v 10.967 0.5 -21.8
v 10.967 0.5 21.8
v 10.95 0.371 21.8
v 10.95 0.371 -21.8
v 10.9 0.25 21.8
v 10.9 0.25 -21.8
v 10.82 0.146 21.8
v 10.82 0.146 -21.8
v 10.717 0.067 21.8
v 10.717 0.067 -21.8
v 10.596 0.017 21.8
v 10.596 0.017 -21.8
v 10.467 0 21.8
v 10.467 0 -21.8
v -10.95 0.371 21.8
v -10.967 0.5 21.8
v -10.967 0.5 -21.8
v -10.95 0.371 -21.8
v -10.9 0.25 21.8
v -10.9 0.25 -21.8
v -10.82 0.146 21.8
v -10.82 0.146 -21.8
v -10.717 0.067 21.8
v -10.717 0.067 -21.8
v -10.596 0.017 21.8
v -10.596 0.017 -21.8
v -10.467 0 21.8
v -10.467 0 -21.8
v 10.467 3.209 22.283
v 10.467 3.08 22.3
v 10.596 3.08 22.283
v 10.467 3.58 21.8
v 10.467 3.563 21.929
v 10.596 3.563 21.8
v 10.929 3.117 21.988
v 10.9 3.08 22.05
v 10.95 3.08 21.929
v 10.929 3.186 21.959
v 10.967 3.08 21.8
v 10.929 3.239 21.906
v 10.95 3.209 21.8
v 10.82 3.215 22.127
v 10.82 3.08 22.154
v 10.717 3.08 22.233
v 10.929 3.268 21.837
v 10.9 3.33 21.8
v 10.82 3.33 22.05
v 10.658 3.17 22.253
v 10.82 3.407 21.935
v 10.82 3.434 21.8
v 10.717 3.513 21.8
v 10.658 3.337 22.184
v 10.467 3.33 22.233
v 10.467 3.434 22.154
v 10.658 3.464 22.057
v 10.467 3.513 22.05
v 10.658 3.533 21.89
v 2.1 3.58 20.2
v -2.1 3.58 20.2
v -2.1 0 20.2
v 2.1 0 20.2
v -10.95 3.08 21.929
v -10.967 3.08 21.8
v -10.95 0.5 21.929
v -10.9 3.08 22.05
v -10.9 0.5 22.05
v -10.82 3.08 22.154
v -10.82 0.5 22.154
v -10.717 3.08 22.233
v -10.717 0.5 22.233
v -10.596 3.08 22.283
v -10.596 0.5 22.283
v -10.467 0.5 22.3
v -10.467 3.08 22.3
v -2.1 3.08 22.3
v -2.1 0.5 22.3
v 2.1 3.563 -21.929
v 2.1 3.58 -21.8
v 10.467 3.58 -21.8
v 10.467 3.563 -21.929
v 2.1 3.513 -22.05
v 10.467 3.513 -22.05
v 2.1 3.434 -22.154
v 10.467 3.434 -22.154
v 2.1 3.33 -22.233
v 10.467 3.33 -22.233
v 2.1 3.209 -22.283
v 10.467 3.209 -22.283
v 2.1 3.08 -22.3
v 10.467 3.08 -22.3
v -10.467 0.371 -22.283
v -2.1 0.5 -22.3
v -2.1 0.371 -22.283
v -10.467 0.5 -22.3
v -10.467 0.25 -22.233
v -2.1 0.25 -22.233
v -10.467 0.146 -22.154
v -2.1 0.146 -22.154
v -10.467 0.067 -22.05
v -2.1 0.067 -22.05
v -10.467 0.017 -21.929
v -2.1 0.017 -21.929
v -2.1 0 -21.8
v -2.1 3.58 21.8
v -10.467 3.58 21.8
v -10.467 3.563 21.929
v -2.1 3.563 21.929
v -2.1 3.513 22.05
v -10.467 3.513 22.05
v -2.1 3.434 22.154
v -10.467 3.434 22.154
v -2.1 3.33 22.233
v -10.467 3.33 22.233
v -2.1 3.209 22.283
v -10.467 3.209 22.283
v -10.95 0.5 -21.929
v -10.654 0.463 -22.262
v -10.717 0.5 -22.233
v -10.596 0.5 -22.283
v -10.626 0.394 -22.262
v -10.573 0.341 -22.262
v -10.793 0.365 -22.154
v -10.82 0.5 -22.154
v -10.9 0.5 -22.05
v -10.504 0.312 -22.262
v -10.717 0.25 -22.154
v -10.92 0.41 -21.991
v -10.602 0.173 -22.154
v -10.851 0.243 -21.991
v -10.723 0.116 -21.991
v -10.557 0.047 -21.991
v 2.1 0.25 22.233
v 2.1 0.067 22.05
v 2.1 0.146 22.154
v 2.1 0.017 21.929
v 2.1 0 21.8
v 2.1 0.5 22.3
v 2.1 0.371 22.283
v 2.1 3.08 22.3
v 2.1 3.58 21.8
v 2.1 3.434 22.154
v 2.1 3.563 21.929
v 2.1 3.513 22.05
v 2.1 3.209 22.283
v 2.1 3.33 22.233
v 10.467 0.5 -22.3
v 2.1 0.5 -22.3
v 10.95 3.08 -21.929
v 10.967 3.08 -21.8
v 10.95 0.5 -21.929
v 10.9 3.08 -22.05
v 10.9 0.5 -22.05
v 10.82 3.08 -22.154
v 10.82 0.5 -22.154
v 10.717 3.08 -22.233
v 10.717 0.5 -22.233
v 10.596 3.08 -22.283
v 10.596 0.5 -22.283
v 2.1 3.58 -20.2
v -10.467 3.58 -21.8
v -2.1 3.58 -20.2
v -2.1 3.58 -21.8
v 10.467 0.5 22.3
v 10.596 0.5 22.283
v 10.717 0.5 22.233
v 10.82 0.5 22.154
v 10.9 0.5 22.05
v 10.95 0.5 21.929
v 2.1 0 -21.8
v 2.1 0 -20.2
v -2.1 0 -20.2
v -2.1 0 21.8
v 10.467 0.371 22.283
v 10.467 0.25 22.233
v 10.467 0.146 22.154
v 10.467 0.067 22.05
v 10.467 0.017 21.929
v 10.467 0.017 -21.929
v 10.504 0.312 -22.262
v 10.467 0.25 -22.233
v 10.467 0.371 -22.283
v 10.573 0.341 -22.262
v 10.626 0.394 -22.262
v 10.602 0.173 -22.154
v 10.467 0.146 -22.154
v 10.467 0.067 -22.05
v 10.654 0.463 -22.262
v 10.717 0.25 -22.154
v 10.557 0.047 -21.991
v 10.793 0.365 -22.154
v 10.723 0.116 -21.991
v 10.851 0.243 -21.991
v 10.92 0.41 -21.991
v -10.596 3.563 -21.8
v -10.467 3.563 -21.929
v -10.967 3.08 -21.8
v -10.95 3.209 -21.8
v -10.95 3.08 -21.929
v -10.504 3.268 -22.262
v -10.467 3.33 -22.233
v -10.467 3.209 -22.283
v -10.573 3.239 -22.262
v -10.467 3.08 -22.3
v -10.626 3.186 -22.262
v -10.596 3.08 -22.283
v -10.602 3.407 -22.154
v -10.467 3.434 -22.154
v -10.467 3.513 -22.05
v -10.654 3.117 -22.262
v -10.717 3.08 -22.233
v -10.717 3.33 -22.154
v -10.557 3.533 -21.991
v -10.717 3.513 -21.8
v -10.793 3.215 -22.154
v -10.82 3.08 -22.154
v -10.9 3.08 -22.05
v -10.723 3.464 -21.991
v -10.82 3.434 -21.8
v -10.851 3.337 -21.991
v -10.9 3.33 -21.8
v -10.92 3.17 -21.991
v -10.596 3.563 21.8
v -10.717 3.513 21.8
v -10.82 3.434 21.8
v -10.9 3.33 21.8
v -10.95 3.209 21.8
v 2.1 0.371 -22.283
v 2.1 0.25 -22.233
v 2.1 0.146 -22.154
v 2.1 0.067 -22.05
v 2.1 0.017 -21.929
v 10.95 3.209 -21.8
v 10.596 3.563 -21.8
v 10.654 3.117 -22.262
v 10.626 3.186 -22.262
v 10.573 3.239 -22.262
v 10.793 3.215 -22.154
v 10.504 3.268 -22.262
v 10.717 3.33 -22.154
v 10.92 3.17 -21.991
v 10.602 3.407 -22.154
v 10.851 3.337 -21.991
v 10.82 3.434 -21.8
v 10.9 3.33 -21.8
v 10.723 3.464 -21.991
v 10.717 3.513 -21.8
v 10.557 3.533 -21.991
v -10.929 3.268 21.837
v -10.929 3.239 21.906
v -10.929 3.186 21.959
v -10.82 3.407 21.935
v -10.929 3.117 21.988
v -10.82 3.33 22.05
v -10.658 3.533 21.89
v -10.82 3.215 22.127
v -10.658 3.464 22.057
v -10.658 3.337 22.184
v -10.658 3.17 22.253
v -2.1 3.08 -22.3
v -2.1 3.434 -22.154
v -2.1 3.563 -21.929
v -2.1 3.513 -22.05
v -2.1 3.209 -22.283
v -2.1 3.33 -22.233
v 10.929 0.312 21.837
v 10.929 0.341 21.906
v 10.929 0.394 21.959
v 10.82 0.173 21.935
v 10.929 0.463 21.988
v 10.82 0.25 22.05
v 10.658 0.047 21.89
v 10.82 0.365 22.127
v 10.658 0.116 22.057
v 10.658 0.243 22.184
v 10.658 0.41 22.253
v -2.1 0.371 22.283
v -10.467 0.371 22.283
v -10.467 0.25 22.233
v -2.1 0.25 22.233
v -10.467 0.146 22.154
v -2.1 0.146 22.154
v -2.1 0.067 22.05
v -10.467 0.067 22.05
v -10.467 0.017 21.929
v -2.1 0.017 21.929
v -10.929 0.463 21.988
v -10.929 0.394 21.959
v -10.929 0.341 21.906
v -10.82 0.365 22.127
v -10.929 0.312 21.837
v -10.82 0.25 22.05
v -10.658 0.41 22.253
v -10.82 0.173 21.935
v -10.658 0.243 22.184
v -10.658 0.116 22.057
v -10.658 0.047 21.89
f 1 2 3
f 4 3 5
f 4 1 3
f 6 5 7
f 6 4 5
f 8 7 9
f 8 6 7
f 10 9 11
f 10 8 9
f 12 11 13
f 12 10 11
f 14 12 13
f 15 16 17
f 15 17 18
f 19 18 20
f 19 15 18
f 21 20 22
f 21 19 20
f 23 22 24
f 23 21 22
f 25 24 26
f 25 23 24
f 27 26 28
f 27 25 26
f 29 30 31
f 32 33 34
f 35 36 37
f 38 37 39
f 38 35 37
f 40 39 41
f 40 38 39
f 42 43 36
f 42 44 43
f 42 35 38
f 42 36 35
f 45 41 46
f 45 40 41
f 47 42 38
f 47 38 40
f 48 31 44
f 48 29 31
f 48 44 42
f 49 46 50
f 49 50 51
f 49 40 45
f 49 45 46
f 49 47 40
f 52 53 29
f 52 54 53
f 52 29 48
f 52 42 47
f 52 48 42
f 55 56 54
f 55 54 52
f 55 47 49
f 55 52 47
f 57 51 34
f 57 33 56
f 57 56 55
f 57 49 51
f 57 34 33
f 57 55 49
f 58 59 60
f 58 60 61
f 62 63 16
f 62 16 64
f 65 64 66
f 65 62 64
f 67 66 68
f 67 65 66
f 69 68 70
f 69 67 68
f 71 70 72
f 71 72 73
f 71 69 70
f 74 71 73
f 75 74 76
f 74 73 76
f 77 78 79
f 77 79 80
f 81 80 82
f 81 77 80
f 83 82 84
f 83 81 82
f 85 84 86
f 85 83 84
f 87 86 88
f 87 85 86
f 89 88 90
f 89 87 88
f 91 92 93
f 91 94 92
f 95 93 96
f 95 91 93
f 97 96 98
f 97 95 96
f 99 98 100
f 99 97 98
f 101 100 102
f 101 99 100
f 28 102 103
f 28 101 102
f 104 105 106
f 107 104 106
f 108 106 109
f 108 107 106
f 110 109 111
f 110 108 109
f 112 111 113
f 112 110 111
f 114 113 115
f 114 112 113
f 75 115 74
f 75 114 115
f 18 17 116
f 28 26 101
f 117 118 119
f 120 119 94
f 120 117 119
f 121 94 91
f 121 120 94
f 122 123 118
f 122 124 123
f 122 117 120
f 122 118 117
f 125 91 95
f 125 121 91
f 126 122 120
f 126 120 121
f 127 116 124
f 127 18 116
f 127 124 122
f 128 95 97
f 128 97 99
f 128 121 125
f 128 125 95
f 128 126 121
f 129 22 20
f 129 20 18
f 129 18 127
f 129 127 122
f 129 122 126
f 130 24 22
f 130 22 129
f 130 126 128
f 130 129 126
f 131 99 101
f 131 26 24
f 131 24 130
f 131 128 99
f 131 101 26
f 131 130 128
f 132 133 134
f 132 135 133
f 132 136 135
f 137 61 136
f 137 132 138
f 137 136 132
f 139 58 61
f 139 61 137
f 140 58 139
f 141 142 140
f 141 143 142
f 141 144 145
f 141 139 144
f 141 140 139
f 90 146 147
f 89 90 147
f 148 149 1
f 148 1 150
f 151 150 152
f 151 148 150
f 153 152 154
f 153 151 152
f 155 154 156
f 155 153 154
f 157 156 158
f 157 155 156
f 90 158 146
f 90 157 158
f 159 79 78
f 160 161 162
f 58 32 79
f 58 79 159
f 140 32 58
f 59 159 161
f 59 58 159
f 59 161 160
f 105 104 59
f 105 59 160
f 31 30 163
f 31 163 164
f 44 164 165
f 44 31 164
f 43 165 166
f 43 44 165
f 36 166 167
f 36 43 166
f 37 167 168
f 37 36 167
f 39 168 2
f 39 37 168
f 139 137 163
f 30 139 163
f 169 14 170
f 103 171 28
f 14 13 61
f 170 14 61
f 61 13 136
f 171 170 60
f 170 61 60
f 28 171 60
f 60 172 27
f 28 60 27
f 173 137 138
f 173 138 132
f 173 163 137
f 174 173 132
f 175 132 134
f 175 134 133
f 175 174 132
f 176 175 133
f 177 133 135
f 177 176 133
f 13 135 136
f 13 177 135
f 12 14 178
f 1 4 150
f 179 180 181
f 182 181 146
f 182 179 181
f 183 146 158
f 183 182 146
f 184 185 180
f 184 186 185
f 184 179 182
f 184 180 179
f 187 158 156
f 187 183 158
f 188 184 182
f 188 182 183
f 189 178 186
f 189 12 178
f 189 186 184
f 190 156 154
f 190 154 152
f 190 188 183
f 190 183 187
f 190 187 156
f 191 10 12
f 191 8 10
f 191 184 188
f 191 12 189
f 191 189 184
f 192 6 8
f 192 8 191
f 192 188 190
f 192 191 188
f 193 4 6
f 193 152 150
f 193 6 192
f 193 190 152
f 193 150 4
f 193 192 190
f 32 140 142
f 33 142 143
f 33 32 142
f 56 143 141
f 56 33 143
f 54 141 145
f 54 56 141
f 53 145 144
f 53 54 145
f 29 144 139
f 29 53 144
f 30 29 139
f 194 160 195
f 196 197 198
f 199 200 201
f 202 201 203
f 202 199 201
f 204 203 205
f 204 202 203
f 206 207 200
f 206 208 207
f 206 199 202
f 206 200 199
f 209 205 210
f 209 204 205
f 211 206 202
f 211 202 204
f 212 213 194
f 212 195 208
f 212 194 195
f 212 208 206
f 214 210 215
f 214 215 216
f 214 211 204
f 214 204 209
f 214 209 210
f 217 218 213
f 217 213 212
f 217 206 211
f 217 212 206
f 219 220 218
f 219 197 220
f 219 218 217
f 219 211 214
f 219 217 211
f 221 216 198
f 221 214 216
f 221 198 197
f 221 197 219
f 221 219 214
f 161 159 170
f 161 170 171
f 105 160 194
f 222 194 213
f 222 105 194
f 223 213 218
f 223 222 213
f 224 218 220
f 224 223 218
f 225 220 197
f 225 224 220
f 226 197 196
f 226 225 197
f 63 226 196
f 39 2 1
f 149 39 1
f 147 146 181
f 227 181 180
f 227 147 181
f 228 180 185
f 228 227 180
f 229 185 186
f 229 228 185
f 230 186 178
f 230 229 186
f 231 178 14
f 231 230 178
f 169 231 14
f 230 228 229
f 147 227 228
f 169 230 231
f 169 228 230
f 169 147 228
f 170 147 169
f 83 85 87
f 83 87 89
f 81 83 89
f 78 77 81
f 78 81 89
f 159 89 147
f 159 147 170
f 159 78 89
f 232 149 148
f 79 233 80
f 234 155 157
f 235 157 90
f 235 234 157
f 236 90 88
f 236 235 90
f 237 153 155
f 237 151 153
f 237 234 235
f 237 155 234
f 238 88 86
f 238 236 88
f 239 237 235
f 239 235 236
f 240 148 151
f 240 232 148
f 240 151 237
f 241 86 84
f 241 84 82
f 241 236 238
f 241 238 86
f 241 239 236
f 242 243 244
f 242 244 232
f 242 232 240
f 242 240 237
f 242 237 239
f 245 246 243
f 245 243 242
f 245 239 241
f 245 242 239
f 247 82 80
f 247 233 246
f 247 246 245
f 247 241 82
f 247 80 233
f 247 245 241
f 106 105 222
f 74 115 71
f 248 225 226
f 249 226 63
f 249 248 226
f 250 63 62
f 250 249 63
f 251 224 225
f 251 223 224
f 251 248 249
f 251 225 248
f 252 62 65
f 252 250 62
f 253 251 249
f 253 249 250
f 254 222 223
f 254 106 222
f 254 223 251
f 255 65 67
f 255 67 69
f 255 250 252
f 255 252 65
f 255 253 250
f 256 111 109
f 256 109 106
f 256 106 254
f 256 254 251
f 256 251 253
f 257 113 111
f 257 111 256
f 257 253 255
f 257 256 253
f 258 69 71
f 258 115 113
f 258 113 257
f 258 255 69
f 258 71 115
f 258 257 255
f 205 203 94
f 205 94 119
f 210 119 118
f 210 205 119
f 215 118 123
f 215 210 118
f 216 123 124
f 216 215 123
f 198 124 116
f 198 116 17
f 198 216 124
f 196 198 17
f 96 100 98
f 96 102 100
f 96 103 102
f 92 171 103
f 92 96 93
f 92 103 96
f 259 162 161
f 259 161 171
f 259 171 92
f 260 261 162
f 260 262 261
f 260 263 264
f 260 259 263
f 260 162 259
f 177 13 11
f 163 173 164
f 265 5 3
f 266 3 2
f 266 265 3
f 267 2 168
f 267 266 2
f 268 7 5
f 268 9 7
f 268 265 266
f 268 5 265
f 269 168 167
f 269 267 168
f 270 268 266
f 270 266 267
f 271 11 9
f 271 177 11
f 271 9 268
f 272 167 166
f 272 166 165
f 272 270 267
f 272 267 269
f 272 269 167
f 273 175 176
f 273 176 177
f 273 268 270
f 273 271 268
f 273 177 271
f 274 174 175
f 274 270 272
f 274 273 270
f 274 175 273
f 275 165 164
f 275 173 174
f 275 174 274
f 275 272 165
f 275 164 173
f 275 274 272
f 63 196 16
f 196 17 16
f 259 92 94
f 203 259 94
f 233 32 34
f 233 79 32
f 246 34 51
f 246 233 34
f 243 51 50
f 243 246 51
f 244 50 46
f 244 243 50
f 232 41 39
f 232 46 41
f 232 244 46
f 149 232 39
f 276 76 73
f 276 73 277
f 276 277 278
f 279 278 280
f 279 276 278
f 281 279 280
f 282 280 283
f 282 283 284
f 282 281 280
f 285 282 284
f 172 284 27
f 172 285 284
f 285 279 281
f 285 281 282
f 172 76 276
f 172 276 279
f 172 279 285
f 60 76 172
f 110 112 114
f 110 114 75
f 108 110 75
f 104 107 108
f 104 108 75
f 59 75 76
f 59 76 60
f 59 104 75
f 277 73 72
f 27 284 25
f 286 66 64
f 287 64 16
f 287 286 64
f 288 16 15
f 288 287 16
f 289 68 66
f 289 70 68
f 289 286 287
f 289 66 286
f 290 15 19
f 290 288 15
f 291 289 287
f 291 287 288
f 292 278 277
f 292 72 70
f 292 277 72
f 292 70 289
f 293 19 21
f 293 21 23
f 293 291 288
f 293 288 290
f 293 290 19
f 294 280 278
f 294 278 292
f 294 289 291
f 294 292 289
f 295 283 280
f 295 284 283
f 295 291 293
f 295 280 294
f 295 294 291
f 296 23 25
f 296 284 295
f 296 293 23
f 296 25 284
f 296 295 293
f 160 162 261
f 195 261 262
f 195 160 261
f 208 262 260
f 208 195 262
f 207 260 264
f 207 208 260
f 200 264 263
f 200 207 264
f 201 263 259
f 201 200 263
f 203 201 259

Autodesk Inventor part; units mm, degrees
ref_plane "Плоскость YZ" through (0, 0, 0) normal (1, 0, 0) x (0, 1, 0)
ref_plane "Плоскость XZ" through (0, 0, 0) normal (0, 1, 0) x (-1, 0, 0)
ref_plane "Плоскость XY" through (0, 0, 0) normal (0, 0, 1) x (1, 0, 0)
sketch "Эскиз1" plane through (0, 0, 0) normal (0, 1, 0) x (-1, 0, 0)
  line L0 (10.9667, 22.3) -> (-10.9667, 22.3)
  line L1 (-10.9667, 22.3) -> (-10.9667, -22.3)
  line L2 (-10.9667, -22.3) -> (10.9667, -22.3)
  line L3 (10.9667, -22.3) -> (10.9667, 22.3)
  line L4 (10.9667, 22.3) -> (-10.9667, -22.3) construction
  line L5 (-10.9667, 22.3) -> (10.9667, -22.3) construction
  point P0 (0, 0)
  dimension "d0" = 44.6
  dimension "d1" = 21.9333
extrude "Выдавливание1" add sketch "Эскиз1" along normal blind 3.58
fillet "Сопряжение1" radius 0.5 12 edges at (0, 3.58, 22.3) (0, 0, 22.3) (10.9667, 1.79, 22.3) (-10.9667, 1.79, 22.3) (-10.9667, 3.58, 0) (10.9667, 3.58, 0) (10.9667, 0, 0) (-10.9667, 0, 0) (0, 3.58, -22.3) (0, 0, -22.3) (-10.9667, 1.79, -22.3) (10.9667, 1.79, -22.3)
sketch "Эскиз2" plane through (0, 3.58, 0) normal (0, 1, 0) x (1, 0, 0)
  line L0 (-2.1, 24.4) -> (2.1, 24.4)
  line L1 (2.1, 24.4) -> (2.1, 20.2)
  line L2 (2.1, 20.2) -> (-2.1, 20.2)
  line L3 (-2.1, 20.2) -> (-2.1, 24.4)
  line L4 (10.4667, 22.3) -> (-10.4667, 22.3) projected
  line L5 (-2.1, 24.4) -> (2.1, 20.2) construction
  line L6 (2.1, 24.4) -> (-2.1, 20.2) construction
  point P0 (0, 0)
  point P1 (0, 22.3)
  dimension "d5" = 4.2
  dimension "d6" = 4.2
extrude "Выдавливание2" cut sketch "Эскиз2" against normal blind 10
mirror "Зеркальное отражение1" about plane through (0, 0, 0) normal (0, 0, 1) of "Выдавливание2"
properties part number "Test2" material "Типовой"
